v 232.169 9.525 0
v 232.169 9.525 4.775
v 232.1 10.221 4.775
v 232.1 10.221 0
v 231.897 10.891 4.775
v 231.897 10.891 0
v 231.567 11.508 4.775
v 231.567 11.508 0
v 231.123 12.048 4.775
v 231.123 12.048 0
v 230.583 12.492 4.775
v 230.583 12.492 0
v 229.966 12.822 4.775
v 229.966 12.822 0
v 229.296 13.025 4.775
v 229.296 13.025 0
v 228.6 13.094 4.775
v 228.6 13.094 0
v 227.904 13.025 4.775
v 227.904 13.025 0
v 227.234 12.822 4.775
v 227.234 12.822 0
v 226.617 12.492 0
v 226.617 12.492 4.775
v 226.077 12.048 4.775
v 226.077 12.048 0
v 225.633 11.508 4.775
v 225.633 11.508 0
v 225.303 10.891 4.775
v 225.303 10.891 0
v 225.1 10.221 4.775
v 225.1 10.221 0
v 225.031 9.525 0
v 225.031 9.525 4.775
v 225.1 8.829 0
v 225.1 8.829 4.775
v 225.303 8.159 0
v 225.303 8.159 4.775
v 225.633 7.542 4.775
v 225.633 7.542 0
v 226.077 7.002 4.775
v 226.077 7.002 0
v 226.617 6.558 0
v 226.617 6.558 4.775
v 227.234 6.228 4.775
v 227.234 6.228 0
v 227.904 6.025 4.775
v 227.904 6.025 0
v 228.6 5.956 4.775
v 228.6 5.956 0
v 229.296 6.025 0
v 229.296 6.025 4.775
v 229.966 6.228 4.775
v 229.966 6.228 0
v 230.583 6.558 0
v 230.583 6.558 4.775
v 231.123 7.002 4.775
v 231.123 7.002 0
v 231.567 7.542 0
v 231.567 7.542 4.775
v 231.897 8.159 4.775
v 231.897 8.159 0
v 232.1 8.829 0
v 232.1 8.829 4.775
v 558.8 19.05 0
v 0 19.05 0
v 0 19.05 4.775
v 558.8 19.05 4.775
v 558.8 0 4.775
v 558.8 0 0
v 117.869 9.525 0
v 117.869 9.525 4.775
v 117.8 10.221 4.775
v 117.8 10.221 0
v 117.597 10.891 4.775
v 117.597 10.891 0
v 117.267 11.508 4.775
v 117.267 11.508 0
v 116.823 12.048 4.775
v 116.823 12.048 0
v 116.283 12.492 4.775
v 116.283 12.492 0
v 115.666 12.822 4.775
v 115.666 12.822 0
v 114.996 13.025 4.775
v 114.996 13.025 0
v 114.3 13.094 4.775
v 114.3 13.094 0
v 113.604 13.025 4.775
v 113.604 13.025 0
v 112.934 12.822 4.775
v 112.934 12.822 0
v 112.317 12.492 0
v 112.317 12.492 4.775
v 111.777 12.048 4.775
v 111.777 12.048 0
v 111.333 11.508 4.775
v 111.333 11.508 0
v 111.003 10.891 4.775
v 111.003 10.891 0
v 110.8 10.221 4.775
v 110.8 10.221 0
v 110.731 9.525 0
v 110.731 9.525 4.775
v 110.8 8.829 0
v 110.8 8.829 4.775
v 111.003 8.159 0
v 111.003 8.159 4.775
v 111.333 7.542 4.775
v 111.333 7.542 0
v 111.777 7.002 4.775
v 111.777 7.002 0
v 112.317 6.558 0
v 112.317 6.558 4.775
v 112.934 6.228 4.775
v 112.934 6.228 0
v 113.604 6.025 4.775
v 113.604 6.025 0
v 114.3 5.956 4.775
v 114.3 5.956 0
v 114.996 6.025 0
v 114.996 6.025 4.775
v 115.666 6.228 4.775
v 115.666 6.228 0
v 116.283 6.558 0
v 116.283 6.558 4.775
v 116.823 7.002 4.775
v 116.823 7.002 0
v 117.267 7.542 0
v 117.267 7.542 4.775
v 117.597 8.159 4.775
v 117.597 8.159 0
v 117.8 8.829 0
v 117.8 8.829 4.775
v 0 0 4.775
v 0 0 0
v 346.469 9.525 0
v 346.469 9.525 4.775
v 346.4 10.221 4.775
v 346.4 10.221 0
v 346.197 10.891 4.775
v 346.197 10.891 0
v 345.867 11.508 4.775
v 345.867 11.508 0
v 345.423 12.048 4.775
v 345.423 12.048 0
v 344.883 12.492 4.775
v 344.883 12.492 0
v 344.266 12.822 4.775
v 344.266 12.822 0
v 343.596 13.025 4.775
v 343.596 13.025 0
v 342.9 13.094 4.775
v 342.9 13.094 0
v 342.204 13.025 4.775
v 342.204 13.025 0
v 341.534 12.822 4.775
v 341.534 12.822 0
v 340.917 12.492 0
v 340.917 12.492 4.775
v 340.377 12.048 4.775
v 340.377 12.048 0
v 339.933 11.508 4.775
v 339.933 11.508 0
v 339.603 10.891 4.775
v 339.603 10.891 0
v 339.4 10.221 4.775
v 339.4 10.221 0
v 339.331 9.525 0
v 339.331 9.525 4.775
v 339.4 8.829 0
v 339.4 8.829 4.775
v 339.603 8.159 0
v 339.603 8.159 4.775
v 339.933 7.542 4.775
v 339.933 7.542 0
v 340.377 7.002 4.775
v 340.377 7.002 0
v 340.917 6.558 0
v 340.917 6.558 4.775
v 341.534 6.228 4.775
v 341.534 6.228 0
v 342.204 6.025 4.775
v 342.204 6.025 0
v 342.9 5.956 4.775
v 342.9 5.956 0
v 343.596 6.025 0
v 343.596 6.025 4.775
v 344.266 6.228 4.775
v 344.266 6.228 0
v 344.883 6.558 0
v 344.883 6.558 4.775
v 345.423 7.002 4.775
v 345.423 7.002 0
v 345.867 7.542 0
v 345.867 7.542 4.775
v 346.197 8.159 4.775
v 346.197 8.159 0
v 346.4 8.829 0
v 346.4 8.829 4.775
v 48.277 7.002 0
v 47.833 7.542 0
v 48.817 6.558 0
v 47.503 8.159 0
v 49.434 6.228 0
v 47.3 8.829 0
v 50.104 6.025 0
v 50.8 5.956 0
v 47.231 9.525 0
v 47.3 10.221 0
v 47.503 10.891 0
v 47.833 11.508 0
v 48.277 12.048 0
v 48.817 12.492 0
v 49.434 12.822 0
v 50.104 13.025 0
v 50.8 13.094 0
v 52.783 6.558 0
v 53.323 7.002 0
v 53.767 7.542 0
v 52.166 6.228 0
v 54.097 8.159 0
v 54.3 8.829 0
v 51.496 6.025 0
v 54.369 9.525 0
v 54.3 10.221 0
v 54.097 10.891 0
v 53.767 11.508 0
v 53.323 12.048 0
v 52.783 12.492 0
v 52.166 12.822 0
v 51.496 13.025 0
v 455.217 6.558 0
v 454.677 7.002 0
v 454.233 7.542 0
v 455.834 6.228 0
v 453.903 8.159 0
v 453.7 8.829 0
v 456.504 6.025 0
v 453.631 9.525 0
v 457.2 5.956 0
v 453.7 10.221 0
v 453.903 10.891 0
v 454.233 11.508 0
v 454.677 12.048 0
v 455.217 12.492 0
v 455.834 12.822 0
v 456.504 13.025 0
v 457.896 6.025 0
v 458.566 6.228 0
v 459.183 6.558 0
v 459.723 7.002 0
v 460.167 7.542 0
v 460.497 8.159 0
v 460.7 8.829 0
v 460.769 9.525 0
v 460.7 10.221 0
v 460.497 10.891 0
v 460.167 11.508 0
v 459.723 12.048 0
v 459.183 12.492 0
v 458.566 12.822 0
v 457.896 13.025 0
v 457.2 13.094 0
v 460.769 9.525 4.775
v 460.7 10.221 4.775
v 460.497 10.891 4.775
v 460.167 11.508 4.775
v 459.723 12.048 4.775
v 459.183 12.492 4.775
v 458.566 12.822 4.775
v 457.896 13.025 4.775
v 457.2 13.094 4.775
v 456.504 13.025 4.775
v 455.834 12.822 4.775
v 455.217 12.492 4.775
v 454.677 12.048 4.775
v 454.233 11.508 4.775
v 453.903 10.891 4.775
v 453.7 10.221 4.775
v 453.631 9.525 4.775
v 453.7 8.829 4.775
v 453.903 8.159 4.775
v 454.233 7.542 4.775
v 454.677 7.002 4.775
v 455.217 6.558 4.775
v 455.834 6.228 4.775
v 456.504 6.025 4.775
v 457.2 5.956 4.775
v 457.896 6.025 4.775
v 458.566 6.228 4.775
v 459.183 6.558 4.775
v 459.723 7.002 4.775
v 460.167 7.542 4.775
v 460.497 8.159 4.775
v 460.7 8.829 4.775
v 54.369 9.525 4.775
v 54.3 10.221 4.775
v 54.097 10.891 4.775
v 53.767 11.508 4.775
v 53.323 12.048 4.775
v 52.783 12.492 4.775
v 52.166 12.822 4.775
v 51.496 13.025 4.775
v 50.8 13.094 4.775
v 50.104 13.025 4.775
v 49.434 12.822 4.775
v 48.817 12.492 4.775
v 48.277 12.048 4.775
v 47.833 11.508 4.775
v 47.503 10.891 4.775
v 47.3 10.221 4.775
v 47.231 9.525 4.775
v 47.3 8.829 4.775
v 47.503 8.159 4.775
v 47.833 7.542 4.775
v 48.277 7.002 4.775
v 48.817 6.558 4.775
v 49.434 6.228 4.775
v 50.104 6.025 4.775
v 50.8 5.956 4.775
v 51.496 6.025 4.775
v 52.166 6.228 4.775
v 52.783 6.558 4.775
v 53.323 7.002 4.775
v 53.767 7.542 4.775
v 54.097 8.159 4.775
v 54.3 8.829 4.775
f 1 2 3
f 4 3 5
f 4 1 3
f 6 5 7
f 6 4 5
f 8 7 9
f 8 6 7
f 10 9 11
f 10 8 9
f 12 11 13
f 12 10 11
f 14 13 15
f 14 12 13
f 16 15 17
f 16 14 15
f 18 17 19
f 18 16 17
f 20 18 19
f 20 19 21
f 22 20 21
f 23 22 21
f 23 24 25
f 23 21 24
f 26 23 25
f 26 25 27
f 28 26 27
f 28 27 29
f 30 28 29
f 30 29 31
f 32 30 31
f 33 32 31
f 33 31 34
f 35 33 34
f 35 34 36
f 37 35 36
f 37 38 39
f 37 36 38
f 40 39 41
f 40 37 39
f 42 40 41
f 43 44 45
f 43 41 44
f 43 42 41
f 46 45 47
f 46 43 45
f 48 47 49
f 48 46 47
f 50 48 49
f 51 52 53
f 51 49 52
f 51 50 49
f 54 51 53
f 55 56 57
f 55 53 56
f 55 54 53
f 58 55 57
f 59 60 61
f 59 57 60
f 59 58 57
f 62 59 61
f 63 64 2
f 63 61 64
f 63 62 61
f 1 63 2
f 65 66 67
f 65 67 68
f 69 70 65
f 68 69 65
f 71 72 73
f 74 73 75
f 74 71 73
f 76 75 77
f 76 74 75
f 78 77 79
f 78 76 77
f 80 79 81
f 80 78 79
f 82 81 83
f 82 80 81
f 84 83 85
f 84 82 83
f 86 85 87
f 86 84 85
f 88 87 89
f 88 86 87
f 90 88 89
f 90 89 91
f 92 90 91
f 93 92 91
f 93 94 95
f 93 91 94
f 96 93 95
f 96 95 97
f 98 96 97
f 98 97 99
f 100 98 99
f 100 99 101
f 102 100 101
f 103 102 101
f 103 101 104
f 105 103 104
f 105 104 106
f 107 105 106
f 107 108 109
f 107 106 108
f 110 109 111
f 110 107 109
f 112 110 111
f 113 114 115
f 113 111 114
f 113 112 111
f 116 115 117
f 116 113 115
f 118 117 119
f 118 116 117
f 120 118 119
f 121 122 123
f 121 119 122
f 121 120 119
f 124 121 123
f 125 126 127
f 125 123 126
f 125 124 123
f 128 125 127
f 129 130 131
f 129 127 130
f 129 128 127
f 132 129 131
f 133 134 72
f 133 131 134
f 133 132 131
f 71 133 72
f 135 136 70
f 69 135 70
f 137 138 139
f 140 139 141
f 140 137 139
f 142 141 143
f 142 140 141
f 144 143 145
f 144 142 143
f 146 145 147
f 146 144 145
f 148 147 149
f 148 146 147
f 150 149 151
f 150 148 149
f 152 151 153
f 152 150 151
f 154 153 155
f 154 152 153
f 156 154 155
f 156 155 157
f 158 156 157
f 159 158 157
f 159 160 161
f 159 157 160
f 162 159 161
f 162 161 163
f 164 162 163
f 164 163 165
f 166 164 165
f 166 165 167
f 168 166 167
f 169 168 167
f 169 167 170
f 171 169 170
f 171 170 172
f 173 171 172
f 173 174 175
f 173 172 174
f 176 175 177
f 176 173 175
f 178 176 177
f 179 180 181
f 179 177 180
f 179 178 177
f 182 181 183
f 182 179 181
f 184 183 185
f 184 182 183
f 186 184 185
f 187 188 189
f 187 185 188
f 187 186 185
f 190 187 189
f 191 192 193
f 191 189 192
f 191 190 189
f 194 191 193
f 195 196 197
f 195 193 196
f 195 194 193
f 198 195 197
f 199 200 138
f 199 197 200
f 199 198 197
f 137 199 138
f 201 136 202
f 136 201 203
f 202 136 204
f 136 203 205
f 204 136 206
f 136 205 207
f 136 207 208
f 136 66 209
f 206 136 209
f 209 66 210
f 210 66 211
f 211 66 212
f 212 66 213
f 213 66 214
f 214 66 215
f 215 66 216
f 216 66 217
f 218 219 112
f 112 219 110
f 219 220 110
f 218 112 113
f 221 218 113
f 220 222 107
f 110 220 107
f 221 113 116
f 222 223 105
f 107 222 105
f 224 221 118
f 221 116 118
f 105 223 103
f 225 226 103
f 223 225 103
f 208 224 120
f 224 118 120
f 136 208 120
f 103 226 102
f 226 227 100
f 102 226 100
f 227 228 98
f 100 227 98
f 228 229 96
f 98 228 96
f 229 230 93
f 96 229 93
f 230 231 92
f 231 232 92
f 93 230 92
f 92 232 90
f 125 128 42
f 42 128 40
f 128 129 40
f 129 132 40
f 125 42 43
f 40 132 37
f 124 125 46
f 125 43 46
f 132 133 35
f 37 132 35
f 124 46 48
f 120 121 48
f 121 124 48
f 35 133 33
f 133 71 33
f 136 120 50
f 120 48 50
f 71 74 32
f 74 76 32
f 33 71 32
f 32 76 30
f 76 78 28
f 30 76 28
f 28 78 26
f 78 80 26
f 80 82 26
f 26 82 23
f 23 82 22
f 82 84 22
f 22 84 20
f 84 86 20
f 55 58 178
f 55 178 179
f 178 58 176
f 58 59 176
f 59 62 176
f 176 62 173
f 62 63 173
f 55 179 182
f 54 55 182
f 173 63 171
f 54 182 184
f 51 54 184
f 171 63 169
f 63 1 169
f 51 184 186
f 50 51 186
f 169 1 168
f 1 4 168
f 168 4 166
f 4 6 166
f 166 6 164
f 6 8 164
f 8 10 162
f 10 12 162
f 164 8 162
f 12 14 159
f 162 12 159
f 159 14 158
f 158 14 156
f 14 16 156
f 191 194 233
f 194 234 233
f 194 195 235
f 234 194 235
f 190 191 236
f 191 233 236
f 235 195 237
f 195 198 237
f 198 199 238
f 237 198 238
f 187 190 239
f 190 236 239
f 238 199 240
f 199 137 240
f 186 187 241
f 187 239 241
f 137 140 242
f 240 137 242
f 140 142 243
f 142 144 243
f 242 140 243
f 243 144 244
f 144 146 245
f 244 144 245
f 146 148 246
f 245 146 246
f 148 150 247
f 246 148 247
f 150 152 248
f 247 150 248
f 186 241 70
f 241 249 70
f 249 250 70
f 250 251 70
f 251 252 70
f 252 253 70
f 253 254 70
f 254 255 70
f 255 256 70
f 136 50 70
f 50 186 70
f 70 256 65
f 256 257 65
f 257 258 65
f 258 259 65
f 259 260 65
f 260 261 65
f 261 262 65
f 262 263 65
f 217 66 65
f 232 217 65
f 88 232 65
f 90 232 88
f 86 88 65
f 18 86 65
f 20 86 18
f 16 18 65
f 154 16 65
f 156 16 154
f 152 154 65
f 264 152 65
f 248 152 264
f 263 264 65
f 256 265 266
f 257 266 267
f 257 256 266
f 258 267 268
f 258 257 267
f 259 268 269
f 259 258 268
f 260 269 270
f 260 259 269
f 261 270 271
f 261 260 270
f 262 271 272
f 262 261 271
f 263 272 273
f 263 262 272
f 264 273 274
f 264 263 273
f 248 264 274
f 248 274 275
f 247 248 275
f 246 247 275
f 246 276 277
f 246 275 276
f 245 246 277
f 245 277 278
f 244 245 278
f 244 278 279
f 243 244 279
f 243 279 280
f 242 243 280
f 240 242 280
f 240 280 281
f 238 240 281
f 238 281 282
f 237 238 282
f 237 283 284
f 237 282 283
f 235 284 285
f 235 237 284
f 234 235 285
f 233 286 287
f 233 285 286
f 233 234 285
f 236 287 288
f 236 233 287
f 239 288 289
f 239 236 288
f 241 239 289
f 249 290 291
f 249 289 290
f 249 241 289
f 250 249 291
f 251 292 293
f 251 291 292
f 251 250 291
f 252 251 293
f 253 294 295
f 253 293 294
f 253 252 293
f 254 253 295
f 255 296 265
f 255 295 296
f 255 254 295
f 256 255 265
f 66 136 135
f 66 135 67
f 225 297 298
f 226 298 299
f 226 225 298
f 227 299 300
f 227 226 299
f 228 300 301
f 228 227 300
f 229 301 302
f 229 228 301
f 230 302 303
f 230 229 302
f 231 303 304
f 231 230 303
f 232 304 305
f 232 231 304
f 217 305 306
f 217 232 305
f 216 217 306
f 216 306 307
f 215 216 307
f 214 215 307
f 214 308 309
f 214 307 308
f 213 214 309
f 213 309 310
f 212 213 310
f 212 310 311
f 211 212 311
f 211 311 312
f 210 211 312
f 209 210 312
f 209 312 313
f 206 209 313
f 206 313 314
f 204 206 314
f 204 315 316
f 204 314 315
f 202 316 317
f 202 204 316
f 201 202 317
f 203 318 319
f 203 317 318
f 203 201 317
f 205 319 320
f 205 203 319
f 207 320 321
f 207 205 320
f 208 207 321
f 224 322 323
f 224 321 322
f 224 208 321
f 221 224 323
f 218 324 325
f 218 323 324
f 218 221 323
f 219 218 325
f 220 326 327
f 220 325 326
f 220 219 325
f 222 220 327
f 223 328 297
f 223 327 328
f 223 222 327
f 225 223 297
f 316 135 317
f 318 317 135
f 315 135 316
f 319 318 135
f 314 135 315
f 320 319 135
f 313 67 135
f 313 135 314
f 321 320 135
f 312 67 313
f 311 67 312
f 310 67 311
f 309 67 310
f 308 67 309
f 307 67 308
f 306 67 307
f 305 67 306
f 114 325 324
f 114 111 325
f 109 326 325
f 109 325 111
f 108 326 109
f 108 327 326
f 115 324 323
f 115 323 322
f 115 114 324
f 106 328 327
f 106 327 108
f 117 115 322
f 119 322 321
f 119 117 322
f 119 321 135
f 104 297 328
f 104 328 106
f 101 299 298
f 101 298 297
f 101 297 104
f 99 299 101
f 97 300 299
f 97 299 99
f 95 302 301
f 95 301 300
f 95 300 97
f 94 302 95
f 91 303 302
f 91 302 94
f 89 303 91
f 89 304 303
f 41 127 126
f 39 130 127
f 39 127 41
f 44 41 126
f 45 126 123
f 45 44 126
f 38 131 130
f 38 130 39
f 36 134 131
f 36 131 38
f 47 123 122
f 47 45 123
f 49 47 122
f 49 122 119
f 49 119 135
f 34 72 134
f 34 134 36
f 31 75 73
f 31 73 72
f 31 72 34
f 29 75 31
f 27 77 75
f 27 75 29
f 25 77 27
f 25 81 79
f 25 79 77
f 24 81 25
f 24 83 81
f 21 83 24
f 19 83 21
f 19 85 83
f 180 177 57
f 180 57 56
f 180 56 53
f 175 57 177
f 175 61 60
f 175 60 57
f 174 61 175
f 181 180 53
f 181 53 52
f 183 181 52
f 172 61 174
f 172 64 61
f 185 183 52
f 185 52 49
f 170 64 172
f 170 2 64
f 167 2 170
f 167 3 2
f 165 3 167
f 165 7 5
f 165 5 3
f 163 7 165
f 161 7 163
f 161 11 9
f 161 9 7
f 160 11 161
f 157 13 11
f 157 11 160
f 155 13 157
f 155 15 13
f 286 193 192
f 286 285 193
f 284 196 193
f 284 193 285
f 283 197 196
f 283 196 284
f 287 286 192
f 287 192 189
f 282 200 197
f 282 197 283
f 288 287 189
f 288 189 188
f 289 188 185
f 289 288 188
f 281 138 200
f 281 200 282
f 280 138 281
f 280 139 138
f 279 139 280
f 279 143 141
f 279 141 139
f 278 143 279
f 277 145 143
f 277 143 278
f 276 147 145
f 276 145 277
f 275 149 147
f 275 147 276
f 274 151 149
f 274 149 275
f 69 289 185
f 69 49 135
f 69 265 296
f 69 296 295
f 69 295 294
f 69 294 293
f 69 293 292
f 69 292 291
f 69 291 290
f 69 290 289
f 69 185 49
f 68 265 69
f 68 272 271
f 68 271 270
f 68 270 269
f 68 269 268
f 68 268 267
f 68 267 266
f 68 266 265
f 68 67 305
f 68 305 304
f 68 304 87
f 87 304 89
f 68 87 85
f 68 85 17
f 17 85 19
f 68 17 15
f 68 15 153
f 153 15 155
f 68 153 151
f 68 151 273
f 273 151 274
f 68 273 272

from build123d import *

# Parameters (mm, degrees)
SKETCH1_W           = 558.8
SKETCH1_H           = 19.05
BOSS_EXTRUDE1_DEPTH = 4.7752
SKETCH2_R           = 3.5687
CUT_EXTRUDE1_DEPTH  = 560.145012528


with BuildPart() as part:
    # Sketch1 → Boss-Extrude1 (new body)
    with BuildSketch(Plane.XY):
        with Locations((279.4, 9.525)):
            Rectangle(SKETCH1_W, SKETCH1_H)
    extrude(amount=BOSS_EXTRUDE1_DEPTH)

    # Sketch2 → Cut-Extrude1 (cut, through all)
    with BuildSketch(Plane.XY):
        with Locations((50.8, 9.525)):
            Circle(SKETCH2_R)
        with Locations((114.3, 9.525)):
            Circle(SKETCH2_R)
        with Locations((228.6, 9.525)):
            Circle(SKETCH2_R)
        with Locations((342.9, 9.525)):
            Circle(SKETCH2_R)
        with Locations((457.2, 9.525)):
            Circle(SKETCH2_R)
    extrude(amount=CUT_EXTRUDE1_DEPTH, mode=Mode.SUBTRACT)


solid = part.part
